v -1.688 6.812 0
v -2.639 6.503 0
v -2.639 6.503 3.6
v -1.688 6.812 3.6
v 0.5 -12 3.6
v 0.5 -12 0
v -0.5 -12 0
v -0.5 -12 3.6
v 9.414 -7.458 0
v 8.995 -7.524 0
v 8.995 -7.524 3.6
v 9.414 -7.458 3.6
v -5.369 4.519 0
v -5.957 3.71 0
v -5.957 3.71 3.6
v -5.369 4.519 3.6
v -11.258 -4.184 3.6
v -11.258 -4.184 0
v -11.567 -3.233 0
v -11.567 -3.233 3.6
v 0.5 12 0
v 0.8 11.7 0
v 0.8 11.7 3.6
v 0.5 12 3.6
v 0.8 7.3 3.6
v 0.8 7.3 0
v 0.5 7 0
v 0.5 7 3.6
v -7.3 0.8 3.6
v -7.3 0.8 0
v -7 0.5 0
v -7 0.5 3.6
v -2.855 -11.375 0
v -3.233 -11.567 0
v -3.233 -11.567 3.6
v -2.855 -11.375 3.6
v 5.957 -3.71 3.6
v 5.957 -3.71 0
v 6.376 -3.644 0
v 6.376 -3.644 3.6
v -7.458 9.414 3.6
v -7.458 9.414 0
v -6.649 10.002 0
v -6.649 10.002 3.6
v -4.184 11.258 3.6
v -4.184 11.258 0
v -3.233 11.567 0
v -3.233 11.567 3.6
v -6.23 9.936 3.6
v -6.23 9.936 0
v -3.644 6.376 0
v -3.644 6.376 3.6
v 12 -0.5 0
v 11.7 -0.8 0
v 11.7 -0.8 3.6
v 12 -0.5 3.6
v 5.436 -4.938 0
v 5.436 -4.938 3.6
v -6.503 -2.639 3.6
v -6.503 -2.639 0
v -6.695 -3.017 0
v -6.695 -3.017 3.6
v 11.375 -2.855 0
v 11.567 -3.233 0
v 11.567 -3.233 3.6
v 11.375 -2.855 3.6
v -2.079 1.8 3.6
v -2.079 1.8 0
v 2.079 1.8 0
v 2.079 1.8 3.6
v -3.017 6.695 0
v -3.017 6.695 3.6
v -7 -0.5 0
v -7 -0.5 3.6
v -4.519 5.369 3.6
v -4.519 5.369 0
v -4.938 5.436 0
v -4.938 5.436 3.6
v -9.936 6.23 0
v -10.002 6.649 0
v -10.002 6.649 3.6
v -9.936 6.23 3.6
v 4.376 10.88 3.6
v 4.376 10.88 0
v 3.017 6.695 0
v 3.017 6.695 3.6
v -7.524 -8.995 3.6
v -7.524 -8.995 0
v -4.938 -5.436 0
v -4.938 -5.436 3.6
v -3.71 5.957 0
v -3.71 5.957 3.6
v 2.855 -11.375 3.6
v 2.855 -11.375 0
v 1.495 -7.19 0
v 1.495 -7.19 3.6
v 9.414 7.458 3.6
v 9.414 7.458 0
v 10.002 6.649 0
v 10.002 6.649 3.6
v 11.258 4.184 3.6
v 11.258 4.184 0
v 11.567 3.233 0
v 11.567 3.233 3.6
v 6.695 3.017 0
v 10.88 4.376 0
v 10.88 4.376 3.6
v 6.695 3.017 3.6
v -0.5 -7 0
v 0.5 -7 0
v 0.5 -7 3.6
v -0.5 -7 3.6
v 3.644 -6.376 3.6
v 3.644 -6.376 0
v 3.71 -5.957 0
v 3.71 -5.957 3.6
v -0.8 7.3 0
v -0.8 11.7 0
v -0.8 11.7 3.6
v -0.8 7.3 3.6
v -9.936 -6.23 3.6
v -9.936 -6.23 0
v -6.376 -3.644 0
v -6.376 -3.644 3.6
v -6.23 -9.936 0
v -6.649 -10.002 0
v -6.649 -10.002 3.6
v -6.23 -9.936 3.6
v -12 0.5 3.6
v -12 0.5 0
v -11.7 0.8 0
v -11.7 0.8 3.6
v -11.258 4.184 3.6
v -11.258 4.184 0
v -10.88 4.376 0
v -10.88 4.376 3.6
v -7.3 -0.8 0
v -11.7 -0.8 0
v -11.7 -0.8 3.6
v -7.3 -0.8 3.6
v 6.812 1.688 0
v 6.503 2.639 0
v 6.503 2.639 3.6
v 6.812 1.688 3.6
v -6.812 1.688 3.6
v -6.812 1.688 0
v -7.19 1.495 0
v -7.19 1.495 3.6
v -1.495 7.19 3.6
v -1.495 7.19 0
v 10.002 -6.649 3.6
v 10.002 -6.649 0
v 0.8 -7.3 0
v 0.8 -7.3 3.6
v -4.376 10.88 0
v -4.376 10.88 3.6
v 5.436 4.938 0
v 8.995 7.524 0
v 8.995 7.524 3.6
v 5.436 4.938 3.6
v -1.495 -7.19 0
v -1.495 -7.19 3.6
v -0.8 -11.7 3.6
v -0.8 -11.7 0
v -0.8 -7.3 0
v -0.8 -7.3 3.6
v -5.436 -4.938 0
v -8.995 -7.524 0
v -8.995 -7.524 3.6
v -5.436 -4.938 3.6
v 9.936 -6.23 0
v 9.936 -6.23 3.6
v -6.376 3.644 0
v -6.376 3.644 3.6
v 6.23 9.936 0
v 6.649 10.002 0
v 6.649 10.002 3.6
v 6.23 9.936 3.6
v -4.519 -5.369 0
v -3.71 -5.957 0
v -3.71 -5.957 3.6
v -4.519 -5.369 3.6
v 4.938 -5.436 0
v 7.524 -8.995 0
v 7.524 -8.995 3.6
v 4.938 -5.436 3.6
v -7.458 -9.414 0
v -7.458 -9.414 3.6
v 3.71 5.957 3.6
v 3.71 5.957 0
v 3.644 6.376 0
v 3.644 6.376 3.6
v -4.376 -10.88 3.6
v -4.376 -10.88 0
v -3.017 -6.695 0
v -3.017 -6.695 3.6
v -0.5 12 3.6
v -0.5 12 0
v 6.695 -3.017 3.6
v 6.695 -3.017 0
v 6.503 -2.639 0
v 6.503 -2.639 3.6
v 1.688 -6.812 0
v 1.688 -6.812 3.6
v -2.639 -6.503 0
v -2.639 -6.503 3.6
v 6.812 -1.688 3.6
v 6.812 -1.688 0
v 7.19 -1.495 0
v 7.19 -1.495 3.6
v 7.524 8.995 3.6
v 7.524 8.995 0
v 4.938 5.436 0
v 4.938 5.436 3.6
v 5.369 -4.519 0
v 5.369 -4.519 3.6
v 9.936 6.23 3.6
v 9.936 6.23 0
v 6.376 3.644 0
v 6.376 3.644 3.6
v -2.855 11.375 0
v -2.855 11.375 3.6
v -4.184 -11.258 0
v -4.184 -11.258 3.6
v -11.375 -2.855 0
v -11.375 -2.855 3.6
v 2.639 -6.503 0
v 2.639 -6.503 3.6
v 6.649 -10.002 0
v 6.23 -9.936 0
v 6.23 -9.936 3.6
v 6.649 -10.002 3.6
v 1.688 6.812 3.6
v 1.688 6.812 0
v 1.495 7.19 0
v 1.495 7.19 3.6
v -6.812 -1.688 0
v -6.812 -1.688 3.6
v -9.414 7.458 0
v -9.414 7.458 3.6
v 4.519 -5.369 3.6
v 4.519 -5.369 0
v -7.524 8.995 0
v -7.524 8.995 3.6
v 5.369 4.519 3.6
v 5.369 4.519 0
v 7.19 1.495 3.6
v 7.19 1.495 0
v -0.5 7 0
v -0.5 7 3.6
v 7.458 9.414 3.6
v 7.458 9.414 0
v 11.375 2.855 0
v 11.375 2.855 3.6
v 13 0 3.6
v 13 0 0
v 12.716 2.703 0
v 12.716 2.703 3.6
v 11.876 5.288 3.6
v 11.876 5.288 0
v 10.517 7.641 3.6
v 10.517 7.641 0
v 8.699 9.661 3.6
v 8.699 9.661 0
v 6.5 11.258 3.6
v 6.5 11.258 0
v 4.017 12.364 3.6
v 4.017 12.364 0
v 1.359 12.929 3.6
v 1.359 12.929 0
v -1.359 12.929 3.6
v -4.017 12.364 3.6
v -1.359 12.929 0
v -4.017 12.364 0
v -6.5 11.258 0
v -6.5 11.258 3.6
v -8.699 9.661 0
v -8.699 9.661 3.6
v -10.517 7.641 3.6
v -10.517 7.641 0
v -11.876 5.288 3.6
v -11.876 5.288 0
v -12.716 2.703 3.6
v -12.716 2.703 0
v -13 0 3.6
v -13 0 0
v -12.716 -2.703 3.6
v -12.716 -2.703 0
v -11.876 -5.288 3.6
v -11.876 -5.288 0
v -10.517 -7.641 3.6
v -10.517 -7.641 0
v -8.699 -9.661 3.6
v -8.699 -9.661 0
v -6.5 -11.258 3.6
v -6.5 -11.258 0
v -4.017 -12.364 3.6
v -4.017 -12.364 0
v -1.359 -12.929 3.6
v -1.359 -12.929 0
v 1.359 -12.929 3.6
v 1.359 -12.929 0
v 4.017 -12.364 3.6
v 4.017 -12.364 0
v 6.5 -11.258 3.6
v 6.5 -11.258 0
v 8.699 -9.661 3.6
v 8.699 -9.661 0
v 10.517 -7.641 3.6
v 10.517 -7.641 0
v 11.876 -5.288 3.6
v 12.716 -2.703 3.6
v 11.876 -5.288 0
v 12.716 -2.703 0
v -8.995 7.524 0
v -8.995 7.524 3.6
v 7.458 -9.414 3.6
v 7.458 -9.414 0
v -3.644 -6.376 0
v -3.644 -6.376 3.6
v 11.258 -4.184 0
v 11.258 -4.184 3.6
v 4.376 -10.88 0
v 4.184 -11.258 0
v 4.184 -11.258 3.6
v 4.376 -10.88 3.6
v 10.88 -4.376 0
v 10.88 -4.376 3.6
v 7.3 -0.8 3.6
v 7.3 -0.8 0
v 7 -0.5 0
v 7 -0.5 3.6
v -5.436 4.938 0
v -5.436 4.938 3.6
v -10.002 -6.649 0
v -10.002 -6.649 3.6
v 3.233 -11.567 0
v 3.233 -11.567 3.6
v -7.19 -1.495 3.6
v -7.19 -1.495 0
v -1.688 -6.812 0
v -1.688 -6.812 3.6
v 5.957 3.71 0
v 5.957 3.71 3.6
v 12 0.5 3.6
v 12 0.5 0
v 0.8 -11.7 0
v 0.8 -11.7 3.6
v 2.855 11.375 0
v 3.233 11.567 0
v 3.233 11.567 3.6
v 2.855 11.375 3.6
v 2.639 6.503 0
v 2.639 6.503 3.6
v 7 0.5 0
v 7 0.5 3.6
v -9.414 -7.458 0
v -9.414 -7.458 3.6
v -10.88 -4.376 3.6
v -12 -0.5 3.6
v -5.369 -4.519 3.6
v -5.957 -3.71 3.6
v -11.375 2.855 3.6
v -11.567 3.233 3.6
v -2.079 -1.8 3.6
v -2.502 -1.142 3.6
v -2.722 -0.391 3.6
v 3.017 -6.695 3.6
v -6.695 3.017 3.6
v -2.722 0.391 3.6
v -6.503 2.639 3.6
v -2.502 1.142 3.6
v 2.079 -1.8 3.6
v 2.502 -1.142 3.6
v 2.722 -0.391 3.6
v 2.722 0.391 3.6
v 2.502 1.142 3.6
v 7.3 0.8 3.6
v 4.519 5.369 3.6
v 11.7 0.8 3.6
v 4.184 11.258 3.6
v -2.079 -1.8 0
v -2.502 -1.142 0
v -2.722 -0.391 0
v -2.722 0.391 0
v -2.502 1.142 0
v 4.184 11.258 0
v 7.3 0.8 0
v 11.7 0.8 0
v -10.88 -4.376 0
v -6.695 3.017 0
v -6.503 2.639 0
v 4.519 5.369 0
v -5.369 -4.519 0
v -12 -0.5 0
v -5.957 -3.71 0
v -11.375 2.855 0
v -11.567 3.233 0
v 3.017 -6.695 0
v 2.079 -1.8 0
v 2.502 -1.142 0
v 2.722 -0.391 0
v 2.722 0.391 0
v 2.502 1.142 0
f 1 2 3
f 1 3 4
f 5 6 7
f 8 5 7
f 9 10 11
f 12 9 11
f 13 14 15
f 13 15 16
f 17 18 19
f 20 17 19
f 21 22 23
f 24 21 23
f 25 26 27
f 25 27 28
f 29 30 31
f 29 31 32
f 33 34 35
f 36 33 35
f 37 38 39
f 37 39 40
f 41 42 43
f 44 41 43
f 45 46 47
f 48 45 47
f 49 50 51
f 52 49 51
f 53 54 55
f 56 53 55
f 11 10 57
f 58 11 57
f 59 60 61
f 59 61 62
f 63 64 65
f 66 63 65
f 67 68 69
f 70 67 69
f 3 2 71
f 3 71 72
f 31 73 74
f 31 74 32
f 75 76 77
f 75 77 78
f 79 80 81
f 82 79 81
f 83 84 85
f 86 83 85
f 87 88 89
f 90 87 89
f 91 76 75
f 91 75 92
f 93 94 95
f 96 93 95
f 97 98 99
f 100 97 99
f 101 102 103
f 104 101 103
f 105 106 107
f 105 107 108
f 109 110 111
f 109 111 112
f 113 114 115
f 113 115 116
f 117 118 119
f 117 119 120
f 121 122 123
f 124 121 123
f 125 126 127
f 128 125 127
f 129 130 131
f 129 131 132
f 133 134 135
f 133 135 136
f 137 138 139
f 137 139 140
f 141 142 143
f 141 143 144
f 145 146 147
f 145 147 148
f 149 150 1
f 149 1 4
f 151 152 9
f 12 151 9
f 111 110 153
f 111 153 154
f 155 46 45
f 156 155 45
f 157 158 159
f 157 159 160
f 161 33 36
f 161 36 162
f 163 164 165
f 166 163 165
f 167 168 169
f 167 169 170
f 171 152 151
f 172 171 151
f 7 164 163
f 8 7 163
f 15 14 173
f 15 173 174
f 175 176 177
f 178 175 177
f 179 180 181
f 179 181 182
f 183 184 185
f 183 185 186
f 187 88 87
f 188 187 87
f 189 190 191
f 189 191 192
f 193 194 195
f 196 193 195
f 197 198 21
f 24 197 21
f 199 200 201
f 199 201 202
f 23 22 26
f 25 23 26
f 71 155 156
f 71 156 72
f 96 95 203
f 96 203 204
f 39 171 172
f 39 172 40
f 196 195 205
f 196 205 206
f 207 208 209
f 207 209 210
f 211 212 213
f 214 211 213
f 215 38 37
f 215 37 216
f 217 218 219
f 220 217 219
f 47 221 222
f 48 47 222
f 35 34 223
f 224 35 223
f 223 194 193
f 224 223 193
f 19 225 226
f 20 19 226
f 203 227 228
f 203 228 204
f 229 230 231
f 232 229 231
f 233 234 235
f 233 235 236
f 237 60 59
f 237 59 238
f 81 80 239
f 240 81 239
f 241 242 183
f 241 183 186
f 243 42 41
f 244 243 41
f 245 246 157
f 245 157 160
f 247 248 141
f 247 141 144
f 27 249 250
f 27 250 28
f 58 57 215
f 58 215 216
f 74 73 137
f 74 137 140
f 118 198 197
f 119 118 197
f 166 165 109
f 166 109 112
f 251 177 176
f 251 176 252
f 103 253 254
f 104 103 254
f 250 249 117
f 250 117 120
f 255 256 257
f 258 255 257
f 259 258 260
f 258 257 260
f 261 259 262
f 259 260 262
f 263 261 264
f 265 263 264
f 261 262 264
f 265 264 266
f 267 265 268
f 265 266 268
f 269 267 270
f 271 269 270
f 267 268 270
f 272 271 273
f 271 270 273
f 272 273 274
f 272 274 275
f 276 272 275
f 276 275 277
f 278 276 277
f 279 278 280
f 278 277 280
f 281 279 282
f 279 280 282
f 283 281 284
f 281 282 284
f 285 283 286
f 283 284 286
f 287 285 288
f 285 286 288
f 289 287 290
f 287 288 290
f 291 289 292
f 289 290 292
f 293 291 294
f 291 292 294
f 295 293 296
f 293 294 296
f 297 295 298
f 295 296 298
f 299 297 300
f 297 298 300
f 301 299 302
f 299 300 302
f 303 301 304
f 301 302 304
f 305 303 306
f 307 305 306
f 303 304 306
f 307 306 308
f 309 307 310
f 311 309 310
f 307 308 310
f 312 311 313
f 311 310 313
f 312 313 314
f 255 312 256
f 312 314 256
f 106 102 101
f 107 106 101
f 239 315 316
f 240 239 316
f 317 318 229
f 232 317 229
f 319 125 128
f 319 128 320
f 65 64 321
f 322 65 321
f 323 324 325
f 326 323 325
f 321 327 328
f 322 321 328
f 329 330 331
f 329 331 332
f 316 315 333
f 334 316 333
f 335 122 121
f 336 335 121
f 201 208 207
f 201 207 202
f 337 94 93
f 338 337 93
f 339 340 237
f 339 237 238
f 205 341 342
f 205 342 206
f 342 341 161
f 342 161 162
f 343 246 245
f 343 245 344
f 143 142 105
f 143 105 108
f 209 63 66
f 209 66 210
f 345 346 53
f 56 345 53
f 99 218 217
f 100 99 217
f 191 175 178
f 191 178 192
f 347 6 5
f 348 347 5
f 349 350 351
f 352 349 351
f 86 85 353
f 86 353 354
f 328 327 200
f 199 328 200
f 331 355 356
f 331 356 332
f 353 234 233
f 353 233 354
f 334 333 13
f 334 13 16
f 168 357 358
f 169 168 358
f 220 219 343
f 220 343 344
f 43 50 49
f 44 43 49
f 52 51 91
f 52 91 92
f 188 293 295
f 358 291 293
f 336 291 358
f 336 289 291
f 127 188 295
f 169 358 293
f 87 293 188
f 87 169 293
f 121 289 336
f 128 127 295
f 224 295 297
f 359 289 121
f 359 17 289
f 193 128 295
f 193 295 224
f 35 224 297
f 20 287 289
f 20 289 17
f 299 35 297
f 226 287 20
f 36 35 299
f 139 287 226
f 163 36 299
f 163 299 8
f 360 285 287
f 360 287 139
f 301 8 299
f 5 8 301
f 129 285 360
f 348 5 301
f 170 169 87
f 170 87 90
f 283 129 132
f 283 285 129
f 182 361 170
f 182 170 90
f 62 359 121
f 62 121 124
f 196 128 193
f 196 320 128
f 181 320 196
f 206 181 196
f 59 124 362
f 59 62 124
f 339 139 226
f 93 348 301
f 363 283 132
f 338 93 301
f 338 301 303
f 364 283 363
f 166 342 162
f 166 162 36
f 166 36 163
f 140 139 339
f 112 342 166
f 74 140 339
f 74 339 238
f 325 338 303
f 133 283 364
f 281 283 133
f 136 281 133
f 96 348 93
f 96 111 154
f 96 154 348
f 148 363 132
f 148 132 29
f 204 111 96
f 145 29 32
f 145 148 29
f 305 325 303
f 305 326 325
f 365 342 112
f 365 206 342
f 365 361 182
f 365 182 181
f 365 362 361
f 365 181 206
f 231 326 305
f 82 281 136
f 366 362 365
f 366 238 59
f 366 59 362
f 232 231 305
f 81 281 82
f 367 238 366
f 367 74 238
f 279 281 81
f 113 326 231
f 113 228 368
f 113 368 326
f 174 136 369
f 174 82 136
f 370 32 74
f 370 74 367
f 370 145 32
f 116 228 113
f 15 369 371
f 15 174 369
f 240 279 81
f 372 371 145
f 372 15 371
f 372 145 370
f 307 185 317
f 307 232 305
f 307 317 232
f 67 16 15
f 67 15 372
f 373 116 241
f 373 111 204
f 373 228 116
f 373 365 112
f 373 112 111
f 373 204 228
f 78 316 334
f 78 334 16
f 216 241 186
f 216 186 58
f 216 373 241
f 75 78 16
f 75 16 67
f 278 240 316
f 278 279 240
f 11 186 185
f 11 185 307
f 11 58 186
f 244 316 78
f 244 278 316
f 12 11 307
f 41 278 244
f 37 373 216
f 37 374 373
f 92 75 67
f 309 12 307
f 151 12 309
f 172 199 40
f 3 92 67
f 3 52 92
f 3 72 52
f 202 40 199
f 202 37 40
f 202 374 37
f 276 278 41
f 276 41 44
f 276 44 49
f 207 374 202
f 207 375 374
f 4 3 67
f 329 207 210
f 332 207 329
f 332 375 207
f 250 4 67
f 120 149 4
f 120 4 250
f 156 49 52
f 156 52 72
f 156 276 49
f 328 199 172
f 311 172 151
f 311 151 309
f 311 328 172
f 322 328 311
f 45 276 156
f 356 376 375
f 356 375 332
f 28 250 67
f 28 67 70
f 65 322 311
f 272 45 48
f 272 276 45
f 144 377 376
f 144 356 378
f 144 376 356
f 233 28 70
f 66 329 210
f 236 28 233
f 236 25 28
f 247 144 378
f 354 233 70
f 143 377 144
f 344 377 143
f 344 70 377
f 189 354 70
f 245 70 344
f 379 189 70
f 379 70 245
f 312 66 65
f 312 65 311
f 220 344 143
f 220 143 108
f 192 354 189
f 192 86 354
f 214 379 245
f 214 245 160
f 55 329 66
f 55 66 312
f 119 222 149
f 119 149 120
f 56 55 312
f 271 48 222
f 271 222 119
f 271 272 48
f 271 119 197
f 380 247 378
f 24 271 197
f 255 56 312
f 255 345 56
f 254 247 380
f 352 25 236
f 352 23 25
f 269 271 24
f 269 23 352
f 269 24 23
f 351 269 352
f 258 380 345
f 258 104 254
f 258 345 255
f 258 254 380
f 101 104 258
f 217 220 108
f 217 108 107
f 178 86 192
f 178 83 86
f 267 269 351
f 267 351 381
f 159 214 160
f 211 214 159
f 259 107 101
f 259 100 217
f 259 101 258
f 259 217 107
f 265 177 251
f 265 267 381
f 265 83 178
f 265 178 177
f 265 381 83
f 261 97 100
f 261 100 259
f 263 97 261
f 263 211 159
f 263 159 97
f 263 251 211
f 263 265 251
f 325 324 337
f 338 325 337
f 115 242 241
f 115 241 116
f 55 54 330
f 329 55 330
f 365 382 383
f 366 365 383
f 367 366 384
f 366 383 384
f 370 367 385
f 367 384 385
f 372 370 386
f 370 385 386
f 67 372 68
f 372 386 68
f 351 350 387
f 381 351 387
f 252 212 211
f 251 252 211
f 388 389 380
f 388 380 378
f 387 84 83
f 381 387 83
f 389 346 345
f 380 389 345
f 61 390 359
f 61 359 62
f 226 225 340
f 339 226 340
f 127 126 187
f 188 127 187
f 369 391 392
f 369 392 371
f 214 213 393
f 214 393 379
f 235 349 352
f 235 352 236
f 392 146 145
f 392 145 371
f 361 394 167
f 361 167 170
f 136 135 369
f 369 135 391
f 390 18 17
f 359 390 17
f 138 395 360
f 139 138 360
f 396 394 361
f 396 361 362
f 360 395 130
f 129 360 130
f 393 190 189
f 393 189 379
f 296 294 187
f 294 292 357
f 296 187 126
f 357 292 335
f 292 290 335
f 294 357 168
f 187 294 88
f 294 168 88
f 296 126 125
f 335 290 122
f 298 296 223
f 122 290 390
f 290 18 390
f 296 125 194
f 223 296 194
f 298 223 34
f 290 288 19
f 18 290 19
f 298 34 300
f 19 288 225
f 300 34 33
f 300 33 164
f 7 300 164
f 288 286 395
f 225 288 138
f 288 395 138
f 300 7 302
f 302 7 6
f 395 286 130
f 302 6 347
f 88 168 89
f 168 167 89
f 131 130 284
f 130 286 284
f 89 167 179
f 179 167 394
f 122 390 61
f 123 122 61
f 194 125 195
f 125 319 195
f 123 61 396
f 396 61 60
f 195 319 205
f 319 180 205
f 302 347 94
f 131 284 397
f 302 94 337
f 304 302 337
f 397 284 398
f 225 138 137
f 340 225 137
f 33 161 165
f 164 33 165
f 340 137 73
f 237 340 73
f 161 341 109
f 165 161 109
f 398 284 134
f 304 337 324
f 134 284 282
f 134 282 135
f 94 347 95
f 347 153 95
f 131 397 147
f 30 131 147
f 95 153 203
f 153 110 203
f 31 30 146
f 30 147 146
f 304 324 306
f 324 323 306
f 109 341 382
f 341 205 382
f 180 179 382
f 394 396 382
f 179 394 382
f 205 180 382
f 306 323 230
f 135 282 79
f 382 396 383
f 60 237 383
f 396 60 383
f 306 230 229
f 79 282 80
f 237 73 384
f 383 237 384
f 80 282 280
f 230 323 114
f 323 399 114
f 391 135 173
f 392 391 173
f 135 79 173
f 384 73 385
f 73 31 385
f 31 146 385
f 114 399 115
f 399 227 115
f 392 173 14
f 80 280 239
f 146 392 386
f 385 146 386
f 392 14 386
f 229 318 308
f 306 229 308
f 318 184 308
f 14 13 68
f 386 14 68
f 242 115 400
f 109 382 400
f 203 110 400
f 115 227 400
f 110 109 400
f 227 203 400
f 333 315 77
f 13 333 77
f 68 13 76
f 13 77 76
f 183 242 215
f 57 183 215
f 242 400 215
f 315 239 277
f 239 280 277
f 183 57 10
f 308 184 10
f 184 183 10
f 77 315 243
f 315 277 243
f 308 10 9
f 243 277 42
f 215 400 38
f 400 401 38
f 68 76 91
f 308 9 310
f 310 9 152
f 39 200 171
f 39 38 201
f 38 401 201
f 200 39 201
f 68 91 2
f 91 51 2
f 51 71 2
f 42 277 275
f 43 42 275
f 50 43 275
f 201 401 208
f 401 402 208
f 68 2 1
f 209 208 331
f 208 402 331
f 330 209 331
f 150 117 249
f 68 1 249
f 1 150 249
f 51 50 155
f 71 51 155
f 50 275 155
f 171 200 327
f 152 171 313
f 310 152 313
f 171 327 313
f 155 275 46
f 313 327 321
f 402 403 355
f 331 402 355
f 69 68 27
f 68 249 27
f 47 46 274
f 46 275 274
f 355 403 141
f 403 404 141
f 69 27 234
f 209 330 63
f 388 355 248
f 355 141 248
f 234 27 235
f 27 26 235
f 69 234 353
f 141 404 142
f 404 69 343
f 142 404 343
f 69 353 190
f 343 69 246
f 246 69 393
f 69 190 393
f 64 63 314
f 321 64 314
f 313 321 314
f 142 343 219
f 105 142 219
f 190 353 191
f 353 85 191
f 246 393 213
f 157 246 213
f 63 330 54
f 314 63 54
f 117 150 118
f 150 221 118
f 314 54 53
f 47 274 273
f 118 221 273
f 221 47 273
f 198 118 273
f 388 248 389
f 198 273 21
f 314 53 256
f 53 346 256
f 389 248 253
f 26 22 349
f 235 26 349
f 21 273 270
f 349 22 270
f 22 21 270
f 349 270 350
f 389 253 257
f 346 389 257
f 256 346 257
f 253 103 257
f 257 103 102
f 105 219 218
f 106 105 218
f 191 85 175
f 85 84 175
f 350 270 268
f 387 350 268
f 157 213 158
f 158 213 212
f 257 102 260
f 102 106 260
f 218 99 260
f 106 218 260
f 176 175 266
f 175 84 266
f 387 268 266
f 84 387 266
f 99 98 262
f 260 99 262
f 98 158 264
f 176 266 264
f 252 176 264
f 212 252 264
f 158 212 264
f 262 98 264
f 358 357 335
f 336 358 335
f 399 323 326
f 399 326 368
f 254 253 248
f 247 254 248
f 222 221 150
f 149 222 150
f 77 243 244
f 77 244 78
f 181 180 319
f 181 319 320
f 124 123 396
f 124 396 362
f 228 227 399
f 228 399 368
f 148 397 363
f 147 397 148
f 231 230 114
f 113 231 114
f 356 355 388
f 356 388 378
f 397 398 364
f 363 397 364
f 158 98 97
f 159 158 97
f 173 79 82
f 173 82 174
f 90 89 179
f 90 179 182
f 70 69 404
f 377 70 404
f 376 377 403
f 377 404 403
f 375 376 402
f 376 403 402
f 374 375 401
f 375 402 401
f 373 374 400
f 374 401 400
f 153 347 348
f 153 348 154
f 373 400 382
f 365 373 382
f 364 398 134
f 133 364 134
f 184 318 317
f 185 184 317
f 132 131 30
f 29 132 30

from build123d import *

# Parameters (mm, degrees)
SKETCH_1_R                           = 13
EXTRUDE_1_DEPTH                      = 3.6
SKETCH_2_W                           = 5
SKETCH_2_H                           = 1.6
CUT_EXTRUDE_2_DEPTH                  = 19.733926444
CHAMFER_1_SIZE                       = 0.3
PATTERN_CIRCULAR_1_COUNT             = 20
CHAMFER_1_OF_PATTERN_CIRCULAR_1_SIZE = 0.3


with BuildPart() as part:
    # Эскиз1 → Бобышка-Вытянуть1 (new body)
    with BuildSketch(Plane.XY):
        Circle(SKETCH_1_R)
        with BuildLine():
            Line((-2.079062289, 1.8), (2.079062289, 1.8))
            ThreePointArc((2.079062289, 1.8), (2.75, 0), (2.079062289, -1.8))
            Line((2.079062289, -1.8), (-2.079062289, -1.8))
            ThreePointArc((-2.079062289, -1.8), (-2.75, 0), (-2.079062289, 1.8))
        make_face(mode=Mode.SUBTRACT)
    extrude(amount=EXTRUDE_1_DEPTH)

    # Эскиз2 → Вырез-Вытянуть2 (cut, through all)
    with BuildSketch(Plane.XY):
        with Locations((-9.5, 0)):
            Rectangle(SKETCH_2_W, SKETCH_2_H)
    cut_extrude_2 = extrude(amount=CUT_EXTRUDE_2_DEPTH, mode=Mode.SUBTRACT)

    # Фаска1
    chamfer_1_edges = [part.edges().sort_by_distance(p)[0] for p in [
        (-7, -0.8, 1.8),
        (-7, 0.8, 1.8),
        (-12, 0.8, 1.8),
        (-12, -0.8, 1.8),
    ]]
    chamfer(chamfer_1_edges, length=CHAMFER_1_SIZE)

    # Круговой массив1: Вырез-Вытянуть2 ×20 about axis
    pattern_circular_1_axis = Axis((0, 0, -80.9), (0, 0, 1))
    for i in range(1, PATTERN_CIRCULAR_1_COUNT):
        add(cut_extrude_2.rotate(pattern_circular_1_axis, i * 360 / PATTERN_CIRCULAR_1_COUNT), mode=Mode.SUBTRACT)

    # Фаска1 of Круговой массив1
    chamfer_1_of_pattern_circular_1_edges = [part.edges().sort_by_distance(p)[0] for p in [
        (-6.410182019, -2.923964174, 1.8),
        (-6.90460921, -1.402273748, 1.8),
        (-11.659891791, -2.947358719, 1.8),
        (-11.1654646, -4.469049146, 1.8),
        (-5.192890759, -4.761710362, 1.8),
        (-6.133347162, -3.467283171, 1.8),
        (-10.178432134, -6.406209432, 1.8),
        (-9.237975731, -7.700636623, 1.8),
        (-3.467283171, -6.133347162, 1.8),
        (-4.761710362, -5.192890759, 1.8),
        (-7.700636623, -9.237975731, 1.8),
        (-6.406209432, -10.178432134, 1.8),
        (-1.402273748, -6.90460921, 1.8),
        (-2.923964174, -6.410182019, 1.8),
        (-4.469049146, -11.1654646, 1.8),
        (-2.947358719, -11.659891791, 1.8),
        (0.8, -7, 1.8),
        (-0.8, -7, 1.8),
        (-0.8, -12, 1.8),
        (0.8, -12, 1.8),
        (2.923964174, -6.410182019, 1.8),
        (1.402273748, -6.90460921, 1.8),
        (2.947358719, -11.659891791, 1.8),
        (4.469049146, -11.1654646, 1.8),
        (4.761710362, -5.192890759, 1.8),
        (3.467283171, -6.133347162, 1.8),
        (6.406209432, -10.178432134, 1.8),
        (7.700636623, -9.237975731, 1.8),
        (6.133347162, -3.467283171, 1.8),
        (5.192890759, -4.761710362, 1.8),
        (9.237975731, -7.700636623, 1.8),
        (10.178432134, -6.406209432, 1.8),
        (6.90460921, -1.402273748, 1.8),
        (6.410182019, -2.923964174, 1.8),
        (11.1654646, -4.469049146, 1.8),
        (11.659891791, -2.947358719, 1.8),
        (7, 0.8, 1.8),
        (7, -0.8, 1.8),
        (12, -0.8, 1.8),
        (12, 0.8, 1.8),
        (6.410182019, 2.923964174, 1.8),
        (6.90460921, 1.402273748, 1.8),
        (11.659891791, 2.947358719, 1.8),
        (11.1654646, 4.469049146, 1.8),
        (5.192890759, 4.761710362, 1.8),
        (6.133347162, 3.467283171, 1.8),
        (10.178432134, 6.406209432, 1.8),
        (9.237975731, 7.700636623, 1.8),
        (3.467283171, 6.133347162, 1.8),
        (4.761710362, 5.192890759, 1.8),
        (7.700636623, 9.237975731, 1.8),
        (6.406209432, 10.178432134, 1.8),
        (1.402273748, 6.90460921, 1.8),
        (2.923964174, 6.410182019, 1.8),
        (4.469049146, 11.1654646, 1.8),
        (2.947358719, 11.659891791, 1.8),
        (-0.8, 7, 1.8),
        (0.8, 7, 1.8),
        (0.8, 12, 1.8),
        (-0.8, 12, 1.8),
        (-2.923964174, 6.410182019, 1.8),
        (-1.402273748, 6.90460921, 1.8),
        (-2.947358719, 11.659891791, 1.8),
        (-4.469049146, 11.1654646, 1.8),
        (-4.761710362, 5.192890759, 1.8),
        (-3.467283171, 6.133347162, 1.8),
        (-6.406209432, 10.178432134, 1.8),
        (-7.700636623, 9.237975731, 1.8),
        (-6.133347162, 3.467283171, 1.8),
        (-5.192890759, 4.761710362, 1.8),
        (-9.237975731, 7.700636623, 1.8),
        (-10.178432134, 6.406209432, 1.8),
        (-6.90460921, 1.402273748, 1.8),
        (-6.410182019, 2.923964174, 1.8),
        (-11.1654646, 4.469049146, 1.8),
        (-11.659891791, 2.947358719, 1.8),
    ]]
    chamfer(chamfer_1_of_pattern_circular_1_edges, length=CHAMFER_1_OF_PATTERN_CIRCULAR_1_SIZE)


solid = part.part
